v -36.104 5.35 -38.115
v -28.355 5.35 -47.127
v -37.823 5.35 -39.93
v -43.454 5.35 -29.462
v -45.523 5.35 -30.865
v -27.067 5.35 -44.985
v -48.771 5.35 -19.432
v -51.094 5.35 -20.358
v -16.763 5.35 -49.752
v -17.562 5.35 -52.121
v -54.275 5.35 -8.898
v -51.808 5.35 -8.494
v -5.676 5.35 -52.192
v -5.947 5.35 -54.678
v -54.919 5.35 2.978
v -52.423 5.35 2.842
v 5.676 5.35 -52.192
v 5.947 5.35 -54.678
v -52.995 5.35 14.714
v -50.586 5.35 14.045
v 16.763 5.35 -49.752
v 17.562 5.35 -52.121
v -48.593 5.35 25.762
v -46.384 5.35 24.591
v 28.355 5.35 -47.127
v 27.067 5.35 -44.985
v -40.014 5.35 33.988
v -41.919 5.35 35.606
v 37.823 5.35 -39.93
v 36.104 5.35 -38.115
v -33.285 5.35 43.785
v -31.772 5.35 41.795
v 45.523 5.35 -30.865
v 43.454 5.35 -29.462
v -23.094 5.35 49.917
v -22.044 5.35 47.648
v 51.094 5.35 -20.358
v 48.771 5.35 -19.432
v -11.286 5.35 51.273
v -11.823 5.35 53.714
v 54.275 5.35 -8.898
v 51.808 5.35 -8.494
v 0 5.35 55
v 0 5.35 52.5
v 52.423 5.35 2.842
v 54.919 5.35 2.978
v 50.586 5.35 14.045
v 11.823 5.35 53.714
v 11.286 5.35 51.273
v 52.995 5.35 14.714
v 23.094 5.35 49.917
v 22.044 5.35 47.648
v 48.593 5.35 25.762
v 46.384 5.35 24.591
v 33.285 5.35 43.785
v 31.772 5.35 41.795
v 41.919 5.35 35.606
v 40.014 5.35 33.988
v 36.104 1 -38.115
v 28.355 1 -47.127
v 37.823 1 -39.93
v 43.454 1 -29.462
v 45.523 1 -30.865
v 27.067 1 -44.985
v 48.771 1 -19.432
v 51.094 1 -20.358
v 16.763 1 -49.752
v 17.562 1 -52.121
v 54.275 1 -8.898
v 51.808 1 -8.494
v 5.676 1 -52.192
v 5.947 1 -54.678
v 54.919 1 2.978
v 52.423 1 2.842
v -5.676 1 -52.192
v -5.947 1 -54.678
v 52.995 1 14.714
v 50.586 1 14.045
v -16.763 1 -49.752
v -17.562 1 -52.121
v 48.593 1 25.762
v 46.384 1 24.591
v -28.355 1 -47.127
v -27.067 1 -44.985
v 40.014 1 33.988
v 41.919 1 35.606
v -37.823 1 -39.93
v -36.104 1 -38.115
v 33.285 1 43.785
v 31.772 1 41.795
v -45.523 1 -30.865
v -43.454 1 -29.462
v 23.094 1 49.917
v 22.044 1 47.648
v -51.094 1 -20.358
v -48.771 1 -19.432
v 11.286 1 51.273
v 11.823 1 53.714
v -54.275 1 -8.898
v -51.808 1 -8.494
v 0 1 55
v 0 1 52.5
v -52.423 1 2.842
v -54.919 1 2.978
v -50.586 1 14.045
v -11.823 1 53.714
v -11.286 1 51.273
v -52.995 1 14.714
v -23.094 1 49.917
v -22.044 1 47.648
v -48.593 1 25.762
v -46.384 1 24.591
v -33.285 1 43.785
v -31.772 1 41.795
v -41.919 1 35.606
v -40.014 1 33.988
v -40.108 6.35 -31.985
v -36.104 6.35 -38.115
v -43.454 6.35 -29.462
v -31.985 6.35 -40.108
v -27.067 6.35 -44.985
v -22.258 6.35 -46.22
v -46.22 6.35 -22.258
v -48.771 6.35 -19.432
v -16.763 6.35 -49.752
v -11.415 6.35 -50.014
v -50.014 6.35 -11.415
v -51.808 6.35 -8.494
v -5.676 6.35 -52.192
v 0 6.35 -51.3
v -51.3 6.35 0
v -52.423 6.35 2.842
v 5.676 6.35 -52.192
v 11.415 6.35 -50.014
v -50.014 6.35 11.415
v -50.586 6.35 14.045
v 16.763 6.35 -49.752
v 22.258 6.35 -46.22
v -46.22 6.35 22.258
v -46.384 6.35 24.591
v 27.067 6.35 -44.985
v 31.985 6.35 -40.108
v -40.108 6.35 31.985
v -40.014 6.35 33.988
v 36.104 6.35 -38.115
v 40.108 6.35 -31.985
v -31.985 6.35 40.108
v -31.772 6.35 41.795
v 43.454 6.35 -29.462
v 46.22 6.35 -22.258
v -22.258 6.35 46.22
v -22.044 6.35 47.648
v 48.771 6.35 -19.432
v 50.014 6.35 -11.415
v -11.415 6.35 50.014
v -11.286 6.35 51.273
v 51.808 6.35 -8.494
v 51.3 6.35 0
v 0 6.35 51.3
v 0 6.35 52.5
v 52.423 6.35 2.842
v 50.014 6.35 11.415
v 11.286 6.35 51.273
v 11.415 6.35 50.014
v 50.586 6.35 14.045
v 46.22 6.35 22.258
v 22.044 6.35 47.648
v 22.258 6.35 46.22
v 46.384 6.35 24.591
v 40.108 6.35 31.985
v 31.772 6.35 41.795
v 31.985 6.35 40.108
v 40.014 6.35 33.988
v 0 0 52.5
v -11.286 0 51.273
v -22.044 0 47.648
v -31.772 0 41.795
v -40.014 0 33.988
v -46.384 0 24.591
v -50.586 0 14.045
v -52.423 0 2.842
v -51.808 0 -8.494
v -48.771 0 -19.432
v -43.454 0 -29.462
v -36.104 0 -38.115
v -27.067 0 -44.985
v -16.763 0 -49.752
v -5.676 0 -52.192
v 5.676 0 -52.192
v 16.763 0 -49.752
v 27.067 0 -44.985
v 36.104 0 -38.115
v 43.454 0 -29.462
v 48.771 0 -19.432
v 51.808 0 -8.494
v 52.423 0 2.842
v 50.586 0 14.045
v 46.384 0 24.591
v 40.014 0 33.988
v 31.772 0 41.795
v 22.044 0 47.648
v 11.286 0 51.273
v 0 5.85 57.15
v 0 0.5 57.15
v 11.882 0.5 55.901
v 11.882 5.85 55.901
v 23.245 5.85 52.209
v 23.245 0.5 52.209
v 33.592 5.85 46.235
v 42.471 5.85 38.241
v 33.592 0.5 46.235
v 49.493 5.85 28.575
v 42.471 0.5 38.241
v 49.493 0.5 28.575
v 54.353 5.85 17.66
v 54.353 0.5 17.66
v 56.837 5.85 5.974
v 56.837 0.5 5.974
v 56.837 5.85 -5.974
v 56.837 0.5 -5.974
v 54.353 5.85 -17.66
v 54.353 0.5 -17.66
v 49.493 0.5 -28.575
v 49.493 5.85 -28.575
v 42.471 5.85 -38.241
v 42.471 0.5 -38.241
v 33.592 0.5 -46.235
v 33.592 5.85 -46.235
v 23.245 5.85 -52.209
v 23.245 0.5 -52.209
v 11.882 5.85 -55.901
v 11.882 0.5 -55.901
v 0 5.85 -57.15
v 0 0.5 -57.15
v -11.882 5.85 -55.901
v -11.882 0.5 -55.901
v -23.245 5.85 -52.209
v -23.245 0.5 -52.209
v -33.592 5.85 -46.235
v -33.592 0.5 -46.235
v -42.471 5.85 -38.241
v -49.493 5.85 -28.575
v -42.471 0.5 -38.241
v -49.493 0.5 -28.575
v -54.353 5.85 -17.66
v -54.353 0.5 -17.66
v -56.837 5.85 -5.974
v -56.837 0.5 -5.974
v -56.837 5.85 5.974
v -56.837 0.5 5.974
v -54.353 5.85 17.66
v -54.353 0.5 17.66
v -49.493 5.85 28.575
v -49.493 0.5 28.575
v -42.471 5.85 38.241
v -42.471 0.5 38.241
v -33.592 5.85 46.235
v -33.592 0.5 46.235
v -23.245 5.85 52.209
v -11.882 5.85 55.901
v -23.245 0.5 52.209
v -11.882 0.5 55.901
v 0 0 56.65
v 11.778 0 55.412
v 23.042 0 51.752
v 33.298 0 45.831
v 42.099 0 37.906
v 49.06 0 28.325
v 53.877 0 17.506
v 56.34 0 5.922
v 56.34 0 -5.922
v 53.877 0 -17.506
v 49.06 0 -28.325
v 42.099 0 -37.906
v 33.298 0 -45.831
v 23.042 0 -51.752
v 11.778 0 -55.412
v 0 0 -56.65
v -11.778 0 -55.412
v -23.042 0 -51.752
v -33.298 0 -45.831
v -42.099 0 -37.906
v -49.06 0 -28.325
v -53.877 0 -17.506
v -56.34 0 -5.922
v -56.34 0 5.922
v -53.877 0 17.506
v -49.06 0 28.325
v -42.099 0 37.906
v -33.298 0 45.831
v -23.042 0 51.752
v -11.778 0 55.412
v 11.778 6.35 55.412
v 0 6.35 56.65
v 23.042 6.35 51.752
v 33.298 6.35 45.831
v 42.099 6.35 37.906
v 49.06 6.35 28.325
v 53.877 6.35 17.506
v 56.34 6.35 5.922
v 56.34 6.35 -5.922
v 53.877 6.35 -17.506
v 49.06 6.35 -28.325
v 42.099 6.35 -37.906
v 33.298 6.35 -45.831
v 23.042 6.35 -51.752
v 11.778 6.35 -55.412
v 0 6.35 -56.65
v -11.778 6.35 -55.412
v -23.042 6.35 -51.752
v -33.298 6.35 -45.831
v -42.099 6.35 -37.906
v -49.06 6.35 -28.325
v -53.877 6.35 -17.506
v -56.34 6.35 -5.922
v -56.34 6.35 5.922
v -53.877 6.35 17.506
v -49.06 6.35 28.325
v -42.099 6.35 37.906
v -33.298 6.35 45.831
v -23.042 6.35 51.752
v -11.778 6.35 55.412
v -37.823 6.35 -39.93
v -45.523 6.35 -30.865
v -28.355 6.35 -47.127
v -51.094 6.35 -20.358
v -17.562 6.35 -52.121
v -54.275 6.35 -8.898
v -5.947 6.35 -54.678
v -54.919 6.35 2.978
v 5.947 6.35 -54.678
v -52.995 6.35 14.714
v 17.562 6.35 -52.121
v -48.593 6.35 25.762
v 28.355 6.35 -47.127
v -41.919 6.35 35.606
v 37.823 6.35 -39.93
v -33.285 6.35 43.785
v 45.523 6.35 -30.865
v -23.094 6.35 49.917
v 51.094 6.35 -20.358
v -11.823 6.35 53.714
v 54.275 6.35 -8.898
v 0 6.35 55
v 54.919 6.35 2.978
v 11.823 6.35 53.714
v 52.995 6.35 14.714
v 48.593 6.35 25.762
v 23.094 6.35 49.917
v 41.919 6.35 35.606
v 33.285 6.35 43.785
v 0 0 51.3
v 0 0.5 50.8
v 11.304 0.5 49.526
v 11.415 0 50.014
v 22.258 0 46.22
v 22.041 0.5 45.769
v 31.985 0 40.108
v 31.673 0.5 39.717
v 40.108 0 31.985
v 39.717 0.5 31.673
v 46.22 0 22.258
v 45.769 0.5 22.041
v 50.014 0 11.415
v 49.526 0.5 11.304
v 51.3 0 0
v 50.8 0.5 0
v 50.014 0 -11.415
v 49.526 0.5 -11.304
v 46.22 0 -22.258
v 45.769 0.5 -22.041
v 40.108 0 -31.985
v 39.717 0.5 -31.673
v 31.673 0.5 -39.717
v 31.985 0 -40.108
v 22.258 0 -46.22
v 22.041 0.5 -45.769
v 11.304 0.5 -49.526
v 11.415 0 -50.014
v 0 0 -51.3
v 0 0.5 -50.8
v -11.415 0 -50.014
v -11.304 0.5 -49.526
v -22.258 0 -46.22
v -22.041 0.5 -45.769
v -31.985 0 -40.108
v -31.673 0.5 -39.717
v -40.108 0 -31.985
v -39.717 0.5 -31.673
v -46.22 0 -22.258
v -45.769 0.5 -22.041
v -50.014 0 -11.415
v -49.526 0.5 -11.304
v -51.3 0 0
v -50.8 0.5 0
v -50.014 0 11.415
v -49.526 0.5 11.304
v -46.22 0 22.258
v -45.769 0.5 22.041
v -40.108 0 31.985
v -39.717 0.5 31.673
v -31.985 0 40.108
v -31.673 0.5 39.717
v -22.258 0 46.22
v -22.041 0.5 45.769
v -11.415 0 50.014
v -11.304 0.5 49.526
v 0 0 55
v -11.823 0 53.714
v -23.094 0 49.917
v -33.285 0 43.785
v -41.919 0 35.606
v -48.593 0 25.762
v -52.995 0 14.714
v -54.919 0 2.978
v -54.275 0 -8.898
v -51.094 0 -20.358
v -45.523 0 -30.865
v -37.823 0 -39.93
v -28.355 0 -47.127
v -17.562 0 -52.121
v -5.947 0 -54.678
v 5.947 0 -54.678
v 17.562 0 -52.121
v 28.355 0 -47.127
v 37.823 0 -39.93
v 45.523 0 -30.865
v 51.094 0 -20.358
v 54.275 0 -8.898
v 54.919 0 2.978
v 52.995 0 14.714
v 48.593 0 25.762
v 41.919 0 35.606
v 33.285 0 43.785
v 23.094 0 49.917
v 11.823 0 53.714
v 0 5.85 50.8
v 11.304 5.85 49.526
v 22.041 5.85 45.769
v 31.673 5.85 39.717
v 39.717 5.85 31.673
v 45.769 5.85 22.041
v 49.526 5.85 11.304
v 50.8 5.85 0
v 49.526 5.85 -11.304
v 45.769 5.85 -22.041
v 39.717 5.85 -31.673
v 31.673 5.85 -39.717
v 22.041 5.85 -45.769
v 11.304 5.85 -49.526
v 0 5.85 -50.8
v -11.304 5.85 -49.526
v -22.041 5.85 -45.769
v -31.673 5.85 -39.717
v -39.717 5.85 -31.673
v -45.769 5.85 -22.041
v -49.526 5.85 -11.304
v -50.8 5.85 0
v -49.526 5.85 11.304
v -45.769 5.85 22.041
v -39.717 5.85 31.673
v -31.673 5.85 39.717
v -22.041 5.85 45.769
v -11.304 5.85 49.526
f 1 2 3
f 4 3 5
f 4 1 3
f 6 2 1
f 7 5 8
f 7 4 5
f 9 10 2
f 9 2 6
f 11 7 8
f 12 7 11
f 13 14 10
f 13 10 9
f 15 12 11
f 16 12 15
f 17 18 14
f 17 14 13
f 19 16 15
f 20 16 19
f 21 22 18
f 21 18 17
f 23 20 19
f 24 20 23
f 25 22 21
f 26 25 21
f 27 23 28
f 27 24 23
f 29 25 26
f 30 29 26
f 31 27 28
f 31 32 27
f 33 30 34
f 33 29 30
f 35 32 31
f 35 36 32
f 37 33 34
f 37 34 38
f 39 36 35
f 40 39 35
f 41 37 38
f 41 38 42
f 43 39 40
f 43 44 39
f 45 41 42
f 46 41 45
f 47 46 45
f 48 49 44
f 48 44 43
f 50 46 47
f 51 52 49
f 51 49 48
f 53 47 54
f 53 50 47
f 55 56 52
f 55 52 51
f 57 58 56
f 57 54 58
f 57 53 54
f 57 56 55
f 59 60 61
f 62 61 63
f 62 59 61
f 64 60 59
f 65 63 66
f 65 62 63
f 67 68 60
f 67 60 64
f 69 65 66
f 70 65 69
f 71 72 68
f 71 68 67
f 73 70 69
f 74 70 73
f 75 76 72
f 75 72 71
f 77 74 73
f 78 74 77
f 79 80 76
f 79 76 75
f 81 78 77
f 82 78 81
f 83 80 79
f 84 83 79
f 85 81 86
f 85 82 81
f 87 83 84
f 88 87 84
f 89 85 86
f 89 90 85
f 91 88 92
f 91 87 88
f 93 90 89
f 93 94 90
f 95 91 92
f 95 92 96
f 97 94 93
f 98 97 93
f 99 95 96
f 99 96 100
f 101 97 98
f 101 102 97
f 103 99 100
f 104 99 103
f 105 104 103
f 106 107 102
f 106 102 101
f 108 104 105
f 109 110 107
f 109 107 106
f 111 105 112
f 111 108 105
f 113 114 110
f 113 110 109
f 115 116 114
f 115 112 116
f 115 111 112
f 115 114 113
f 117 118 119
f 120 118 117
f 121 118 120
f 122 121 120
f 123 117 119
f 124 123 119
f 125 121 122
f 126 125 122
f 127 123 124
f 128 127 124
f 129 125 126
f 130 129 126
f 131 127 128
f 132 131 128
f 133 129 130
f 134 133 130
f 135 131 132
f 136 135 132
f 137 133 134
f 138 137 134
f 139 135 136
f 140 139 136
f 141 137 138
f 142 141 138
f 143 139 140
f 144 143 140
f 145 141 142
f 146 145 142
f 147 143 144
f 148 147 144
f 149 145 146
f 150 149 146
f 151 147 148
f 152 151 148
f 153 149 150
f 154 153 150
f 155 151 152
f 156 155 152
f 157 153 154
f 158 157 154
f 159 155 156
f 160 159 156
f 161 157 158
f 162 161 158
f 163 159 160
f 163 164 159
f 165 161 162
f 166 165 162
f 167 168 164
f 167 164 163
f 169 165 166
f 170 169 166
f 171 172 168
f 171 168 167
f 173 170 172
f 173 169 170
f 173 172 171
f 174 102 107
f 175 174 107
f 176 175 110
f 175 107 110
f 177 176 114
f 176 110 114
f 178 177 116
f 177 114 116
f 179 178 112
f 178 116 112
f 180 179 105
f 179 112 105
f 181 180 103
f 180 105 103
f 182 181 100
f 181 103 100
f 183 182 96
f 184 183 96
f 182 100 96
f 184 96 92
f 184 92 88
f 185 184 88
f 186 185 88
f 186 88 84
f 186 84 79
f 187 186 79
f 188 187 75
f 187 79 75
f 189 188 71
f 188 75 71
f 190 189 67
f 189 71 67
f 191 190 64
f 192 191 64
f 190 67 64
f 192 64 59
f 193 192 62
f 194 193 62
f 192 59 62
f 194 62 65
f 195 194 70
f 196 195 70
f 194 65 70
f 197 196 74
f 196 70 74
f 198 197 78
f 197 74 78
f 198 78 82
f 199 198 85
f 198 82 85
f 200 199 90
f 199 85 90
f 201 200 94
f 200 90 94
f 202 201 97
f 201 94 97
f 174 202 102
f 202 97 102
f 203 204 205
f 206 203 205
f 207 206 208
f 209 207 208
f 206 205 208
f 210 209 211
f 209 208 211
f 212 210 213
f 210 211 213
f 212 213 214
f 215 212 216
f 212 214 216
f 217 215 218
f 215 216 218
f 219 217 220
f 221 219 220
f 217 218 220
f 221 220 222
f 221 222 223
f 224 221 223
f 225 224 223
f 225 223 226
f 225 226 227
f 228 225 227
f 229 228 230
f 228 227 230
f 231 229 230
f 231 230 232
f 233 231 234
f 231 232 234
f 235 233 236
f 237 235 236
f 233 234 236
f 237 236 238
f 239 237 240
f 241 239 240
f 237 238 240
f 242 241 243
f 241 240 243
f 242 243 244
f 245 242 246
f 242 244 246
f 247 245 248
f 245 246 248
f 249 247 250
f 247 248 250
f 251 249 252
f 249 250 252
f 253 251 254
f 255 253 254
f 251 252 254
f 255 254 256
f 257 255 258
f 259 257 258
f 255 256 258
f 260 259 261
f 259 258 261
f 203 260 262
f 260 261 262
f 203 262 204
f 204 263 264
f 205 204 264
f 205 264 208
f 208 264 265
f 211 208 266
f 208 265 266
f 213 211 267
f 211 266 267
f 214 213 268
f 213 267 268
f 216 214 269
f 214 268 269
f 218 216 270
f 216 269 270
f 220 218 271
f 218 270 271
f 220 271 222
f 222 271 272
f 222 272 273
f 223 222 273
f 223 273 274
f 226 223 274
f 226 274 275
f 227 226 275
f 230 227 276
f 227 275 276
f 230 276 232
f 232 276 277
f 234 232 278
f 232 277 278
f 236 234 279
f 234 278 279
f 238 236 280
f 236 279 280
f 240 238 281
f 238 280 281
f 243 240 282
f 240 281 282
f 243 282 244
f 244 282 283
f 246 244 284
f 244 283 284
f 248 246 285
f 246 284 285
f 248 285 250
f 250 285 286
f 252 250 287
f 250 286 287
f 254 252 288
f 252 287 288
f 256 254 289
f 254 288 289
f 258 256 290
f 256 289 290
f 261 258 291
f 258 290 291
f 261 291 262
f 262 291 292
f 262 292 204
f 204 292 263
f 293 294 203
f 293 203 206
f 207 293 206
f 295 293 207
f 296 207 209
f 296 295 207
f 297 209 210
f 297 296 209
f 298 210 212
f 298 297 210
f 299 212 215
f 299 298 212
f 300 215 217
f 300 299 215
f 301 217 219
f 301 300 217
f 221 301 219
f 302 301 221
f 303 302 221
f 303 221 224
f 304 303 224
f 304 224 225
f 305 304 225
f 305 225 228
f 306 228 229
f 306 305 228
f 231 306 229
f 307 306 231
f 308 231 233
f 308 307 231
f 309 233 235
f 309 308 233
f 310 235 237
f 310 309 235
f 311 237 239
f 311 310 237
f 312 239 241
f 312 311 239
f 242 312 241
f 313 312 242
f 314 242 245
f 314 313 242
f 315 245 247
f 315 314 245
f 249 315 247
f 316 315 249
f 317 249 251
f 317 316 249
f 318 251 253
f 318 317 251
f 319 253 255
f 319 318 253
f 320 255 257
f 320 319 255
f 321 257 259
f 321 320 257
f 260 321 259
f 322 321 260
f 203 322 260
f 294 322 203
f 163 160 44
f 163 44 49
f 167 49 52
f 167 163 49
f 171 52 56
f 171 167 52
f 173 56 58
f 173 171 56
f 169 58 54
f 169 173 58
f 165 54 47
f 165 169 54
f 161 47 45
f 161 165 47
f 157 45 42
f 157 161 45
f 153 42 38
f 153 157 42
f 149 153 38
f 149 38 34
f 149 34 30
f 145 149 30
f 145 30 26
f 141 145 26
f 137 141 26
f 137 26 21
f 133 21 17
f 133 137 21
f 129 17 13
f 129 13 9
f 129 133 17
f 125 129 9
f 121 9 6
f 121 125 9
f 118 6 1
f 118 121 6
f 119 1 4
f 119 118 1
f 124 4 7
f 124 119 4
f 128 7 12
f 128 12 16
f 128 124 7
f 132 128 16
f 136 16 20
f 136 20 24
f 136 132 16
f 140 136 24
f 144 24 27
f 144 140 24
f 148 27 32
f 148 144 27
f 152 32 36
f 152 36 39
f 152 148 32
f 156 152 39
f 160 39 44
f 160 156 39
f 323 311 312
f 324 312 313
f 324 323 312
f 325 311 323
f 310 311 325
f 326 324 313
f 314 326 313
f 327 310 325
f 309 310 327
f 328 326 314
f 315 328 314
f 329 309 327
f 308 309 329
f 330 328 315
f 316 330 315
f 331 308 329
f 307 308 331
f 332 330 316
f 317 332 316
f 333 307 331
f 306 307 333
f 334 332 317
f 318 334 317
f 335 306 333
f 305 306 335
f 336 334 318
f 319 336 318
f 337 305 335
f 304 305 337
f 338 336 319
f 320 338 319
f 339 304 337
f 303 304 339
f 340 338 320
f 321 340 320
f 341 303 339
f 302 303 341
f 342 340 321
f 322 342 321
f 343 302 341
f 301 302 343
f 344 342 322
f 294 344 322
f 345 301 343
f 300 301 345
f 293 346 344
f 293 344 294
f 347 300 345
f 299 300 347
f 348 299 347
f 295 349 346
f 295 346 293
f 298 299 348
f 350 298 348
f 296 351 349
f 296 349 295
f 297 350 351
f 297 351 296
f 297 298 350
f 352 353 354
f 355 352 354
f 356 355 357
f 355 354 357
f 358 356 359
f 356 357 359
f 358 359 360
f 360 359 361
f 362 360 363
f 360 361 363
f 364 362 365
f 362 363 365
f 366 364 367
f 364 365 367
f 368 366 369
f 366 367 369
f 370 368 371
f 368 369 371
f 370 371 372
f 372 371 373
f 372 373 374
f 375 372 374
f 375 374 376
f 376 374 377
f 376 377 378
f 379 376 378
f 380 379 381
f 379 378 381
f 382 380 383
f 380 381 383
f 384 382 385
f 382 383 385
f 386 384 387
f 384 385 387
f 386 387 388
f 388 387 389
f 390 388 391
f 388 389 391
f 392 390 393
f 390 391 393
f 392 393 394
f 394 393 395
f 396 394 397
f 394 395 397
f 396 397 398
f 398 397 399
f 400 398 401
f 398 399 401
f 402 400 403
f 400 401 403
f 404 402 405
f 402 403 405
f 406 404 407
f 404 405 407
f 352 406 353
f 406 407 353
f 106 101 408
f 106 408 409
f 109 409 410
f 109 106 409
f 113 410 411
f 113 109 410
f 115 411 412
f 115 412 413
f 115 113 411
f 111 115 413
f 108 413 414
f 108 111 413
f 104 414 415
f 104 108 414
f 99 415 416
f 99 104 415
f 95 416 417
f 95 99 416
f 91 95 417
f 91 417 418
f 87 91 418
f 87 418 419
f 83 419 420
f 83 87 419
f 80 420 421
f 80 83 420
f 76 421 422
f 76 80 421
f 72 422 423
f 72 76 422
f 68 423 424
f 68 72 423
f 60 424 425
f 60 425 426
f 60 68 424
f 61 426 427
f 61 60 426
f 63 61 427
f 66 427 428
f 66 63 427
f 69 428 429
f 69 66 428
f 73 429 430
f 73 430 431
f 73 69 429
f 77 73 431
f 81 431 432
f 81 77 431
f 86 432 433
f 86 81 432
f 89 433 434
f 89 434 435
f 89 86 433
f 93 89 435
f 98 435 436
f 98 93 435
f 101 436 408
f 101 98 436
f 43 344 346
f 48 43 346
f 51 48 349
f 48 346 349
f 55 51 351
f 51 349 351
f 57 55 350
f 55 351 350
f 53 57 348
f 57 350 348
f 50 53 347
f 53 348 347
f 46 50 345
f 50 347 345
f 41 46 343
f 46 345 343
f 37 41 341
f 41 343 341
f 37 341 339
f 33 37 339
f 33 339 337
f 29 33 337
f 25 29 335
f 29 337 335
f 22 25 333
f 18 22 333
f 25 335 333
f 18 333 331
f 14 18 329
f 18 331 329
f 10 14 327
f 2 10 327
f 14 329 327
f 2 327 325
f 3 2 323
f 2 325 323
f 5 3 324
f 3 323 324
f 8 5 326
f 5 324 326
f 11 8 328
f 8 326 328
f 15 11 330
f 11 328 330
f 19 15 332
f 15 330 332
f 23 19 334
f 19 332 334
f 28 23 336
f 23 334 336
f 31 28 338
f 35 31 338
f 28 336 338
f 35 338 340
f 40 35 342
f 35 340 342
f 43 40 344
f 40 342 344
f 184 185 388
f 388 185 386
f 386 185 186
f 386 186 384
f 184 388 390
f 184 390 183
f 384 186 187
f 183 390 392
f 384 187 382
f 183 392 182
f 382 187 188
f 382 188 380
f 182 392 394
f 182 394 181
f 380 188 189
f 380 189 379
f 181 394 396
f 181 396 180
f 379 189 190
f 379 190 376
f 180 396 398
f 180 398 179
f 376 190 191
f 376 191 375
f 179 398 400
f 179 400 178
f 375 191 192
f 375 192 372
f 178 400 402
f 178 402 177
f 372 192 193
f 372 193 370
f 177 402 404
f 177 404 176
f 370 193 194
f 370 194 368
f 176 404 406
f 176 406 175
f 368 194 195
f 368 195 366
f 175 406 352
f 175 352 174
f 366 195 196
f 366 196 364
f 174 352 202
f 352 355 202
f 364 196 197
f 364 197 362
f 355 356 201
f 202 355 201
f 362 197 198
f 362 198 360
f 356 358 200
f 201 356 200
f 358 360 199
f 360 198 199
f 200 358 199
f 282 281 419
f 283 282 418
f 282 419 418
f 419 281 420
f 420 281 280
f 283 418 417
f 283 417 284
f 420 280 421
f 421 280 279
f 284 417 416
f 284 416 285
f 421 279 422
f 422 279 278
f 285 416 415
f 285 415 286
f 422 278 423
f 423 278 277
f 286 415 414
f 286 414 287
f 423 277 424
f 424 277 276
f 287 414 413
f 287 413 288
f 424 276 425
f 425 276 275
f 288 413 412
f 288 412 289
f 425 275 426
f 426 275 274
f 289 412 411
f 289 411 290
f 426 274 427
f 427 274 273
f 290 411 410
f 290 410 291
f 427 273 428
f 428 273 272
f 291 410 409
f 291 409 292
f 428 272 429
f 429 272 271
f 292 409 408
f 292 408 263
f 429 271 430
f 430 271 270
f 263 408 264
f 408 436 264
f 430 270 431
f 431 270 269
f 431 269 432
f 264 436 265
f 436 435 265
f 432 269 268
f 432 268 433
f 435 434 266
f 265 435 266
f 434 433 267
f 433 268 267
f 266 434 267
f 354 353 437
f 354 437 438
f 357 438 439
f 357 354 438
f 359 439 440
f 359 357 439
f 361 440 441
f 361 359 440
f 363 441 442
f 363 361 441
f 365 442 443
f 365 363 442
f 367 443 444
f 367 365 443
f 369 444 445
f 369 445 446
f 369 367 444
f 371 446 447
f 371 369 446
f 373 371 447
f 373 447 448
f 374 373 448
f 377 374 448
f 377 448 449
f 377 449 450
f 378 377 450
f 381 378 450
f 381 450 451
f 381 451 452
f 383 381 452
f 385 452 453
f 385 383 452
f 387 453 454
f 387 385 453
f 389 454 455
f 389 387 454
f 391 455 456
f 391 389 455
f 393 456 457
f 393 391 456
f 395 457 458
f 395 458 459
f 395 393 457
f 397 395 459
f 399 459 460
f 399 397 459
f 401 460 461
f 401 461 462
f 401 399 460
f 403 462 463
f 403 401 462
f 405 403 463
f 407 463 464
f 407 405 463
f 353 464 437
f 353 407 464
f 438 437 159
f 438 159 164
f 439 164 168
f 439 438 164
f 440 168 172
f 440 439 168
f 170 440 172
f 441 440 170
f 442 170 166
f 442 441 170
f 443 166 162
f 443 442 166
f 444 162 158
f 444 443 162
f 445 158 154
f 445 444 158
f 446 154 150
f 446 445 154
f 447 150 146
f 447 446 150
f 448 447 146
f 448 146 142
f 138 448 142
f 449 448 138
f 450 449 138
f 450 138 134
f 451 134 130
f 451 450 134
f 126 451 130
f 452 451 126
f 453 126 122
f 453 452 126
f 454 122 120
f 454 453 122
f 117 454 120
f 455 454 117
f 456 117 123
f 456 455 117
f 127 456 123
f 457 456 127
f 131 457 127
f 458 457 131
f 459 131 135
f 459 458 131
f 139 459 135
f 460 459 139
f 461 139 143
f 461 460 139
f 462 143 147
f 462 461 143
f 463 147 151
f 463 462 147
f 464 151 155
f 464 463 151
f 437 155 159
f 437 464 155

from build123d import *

# Parameters (mm, degrees)
SKETCH_1_R          = 57.15
SKETCH_1_R_2        = 50.8
EXTRUDE_1_DEPTH     = 6.35
SKETCH_2_R          = 55
SKETCH_2_R_2        = 52.5
CUT_EXTRUDE_1_DEPTH = 1
CUT_EXTRUDE_START   = -1
SKETCH_3_R          = 55
SKETCH_3_R_2        = 52.5
CUT_EXTRUDE_2_DEPTH = 1
CHAMFER_1_SIZE      = 0.5


with BuildPart() as part:
    # 草图1 → 凸台-拉伸1 (new body)
    with BuildSketch(Plane(origin=(0, 0, 0), x_dir=(1, 0, 0), z_dir=(0, 1, 0))):
        with Locations(Location((0, 0, 0), (0, 0, 270))):
            Circle(SKETCH_1_R)
        with Locations(Location((0, 0, 0), (0, 0, 270))):
            Circle(SKETCH_1_R_2, mode=Mode.SUBTRACT)
    extrude(amount=EXTRUDE_1_DEPTH)

    # 草图2 → 切除-拉伸1 (cut)
    with BuildSketch(Plane(origin=(0, 6.35, 0), x_dir=(1, 0, 0), z_dir=(0, 1, 0))):
        with Locations(Location((0, 0, 0), (0, 0, 270))):
            Circle(SKETCH_2_R)
        with Locations(Location((0, 0, 0), (0, 0, 270))):
            Circle(SKETCH_2_R_2, mode=Mode.SUBTRACT)
    extrude(amount=-CUT_EXTRUDE_1_DEPTH, mode=Mode.SUBTRACT)

    # 草图3 → 切除-拉伸2 (cut)
    with BuildSketch(Plane.XZ.offset(CUT_EXTRUDE_START)):
        with Locations(Location((0, 0, 0), (0, 0, 90))):
            Circle(SKETCH_3_R)
        with Locations(Location((0, 0, 0), (0, 0, 90))):
            Circle(SKETCH_3_R_2, mode=Mode.SUBTRACT)
    extrude(amount=CUT_EXTRUDE_2_DEPTH, mode=Mode.SUBTRACT)

    # 倒角1
    chamfer_1_edges = [part.edges().sort_by_distance(p)[0] for p in [
        (0, 0, -57.15),
        (0, 6.35, -57.15),
        (0, 0, -50.8),
        (0, 6.35, -50.8),
    ]]
    chamfer(chamfer_1_edges, length=CHAMFER_1_SIZE)


solid = part.part
